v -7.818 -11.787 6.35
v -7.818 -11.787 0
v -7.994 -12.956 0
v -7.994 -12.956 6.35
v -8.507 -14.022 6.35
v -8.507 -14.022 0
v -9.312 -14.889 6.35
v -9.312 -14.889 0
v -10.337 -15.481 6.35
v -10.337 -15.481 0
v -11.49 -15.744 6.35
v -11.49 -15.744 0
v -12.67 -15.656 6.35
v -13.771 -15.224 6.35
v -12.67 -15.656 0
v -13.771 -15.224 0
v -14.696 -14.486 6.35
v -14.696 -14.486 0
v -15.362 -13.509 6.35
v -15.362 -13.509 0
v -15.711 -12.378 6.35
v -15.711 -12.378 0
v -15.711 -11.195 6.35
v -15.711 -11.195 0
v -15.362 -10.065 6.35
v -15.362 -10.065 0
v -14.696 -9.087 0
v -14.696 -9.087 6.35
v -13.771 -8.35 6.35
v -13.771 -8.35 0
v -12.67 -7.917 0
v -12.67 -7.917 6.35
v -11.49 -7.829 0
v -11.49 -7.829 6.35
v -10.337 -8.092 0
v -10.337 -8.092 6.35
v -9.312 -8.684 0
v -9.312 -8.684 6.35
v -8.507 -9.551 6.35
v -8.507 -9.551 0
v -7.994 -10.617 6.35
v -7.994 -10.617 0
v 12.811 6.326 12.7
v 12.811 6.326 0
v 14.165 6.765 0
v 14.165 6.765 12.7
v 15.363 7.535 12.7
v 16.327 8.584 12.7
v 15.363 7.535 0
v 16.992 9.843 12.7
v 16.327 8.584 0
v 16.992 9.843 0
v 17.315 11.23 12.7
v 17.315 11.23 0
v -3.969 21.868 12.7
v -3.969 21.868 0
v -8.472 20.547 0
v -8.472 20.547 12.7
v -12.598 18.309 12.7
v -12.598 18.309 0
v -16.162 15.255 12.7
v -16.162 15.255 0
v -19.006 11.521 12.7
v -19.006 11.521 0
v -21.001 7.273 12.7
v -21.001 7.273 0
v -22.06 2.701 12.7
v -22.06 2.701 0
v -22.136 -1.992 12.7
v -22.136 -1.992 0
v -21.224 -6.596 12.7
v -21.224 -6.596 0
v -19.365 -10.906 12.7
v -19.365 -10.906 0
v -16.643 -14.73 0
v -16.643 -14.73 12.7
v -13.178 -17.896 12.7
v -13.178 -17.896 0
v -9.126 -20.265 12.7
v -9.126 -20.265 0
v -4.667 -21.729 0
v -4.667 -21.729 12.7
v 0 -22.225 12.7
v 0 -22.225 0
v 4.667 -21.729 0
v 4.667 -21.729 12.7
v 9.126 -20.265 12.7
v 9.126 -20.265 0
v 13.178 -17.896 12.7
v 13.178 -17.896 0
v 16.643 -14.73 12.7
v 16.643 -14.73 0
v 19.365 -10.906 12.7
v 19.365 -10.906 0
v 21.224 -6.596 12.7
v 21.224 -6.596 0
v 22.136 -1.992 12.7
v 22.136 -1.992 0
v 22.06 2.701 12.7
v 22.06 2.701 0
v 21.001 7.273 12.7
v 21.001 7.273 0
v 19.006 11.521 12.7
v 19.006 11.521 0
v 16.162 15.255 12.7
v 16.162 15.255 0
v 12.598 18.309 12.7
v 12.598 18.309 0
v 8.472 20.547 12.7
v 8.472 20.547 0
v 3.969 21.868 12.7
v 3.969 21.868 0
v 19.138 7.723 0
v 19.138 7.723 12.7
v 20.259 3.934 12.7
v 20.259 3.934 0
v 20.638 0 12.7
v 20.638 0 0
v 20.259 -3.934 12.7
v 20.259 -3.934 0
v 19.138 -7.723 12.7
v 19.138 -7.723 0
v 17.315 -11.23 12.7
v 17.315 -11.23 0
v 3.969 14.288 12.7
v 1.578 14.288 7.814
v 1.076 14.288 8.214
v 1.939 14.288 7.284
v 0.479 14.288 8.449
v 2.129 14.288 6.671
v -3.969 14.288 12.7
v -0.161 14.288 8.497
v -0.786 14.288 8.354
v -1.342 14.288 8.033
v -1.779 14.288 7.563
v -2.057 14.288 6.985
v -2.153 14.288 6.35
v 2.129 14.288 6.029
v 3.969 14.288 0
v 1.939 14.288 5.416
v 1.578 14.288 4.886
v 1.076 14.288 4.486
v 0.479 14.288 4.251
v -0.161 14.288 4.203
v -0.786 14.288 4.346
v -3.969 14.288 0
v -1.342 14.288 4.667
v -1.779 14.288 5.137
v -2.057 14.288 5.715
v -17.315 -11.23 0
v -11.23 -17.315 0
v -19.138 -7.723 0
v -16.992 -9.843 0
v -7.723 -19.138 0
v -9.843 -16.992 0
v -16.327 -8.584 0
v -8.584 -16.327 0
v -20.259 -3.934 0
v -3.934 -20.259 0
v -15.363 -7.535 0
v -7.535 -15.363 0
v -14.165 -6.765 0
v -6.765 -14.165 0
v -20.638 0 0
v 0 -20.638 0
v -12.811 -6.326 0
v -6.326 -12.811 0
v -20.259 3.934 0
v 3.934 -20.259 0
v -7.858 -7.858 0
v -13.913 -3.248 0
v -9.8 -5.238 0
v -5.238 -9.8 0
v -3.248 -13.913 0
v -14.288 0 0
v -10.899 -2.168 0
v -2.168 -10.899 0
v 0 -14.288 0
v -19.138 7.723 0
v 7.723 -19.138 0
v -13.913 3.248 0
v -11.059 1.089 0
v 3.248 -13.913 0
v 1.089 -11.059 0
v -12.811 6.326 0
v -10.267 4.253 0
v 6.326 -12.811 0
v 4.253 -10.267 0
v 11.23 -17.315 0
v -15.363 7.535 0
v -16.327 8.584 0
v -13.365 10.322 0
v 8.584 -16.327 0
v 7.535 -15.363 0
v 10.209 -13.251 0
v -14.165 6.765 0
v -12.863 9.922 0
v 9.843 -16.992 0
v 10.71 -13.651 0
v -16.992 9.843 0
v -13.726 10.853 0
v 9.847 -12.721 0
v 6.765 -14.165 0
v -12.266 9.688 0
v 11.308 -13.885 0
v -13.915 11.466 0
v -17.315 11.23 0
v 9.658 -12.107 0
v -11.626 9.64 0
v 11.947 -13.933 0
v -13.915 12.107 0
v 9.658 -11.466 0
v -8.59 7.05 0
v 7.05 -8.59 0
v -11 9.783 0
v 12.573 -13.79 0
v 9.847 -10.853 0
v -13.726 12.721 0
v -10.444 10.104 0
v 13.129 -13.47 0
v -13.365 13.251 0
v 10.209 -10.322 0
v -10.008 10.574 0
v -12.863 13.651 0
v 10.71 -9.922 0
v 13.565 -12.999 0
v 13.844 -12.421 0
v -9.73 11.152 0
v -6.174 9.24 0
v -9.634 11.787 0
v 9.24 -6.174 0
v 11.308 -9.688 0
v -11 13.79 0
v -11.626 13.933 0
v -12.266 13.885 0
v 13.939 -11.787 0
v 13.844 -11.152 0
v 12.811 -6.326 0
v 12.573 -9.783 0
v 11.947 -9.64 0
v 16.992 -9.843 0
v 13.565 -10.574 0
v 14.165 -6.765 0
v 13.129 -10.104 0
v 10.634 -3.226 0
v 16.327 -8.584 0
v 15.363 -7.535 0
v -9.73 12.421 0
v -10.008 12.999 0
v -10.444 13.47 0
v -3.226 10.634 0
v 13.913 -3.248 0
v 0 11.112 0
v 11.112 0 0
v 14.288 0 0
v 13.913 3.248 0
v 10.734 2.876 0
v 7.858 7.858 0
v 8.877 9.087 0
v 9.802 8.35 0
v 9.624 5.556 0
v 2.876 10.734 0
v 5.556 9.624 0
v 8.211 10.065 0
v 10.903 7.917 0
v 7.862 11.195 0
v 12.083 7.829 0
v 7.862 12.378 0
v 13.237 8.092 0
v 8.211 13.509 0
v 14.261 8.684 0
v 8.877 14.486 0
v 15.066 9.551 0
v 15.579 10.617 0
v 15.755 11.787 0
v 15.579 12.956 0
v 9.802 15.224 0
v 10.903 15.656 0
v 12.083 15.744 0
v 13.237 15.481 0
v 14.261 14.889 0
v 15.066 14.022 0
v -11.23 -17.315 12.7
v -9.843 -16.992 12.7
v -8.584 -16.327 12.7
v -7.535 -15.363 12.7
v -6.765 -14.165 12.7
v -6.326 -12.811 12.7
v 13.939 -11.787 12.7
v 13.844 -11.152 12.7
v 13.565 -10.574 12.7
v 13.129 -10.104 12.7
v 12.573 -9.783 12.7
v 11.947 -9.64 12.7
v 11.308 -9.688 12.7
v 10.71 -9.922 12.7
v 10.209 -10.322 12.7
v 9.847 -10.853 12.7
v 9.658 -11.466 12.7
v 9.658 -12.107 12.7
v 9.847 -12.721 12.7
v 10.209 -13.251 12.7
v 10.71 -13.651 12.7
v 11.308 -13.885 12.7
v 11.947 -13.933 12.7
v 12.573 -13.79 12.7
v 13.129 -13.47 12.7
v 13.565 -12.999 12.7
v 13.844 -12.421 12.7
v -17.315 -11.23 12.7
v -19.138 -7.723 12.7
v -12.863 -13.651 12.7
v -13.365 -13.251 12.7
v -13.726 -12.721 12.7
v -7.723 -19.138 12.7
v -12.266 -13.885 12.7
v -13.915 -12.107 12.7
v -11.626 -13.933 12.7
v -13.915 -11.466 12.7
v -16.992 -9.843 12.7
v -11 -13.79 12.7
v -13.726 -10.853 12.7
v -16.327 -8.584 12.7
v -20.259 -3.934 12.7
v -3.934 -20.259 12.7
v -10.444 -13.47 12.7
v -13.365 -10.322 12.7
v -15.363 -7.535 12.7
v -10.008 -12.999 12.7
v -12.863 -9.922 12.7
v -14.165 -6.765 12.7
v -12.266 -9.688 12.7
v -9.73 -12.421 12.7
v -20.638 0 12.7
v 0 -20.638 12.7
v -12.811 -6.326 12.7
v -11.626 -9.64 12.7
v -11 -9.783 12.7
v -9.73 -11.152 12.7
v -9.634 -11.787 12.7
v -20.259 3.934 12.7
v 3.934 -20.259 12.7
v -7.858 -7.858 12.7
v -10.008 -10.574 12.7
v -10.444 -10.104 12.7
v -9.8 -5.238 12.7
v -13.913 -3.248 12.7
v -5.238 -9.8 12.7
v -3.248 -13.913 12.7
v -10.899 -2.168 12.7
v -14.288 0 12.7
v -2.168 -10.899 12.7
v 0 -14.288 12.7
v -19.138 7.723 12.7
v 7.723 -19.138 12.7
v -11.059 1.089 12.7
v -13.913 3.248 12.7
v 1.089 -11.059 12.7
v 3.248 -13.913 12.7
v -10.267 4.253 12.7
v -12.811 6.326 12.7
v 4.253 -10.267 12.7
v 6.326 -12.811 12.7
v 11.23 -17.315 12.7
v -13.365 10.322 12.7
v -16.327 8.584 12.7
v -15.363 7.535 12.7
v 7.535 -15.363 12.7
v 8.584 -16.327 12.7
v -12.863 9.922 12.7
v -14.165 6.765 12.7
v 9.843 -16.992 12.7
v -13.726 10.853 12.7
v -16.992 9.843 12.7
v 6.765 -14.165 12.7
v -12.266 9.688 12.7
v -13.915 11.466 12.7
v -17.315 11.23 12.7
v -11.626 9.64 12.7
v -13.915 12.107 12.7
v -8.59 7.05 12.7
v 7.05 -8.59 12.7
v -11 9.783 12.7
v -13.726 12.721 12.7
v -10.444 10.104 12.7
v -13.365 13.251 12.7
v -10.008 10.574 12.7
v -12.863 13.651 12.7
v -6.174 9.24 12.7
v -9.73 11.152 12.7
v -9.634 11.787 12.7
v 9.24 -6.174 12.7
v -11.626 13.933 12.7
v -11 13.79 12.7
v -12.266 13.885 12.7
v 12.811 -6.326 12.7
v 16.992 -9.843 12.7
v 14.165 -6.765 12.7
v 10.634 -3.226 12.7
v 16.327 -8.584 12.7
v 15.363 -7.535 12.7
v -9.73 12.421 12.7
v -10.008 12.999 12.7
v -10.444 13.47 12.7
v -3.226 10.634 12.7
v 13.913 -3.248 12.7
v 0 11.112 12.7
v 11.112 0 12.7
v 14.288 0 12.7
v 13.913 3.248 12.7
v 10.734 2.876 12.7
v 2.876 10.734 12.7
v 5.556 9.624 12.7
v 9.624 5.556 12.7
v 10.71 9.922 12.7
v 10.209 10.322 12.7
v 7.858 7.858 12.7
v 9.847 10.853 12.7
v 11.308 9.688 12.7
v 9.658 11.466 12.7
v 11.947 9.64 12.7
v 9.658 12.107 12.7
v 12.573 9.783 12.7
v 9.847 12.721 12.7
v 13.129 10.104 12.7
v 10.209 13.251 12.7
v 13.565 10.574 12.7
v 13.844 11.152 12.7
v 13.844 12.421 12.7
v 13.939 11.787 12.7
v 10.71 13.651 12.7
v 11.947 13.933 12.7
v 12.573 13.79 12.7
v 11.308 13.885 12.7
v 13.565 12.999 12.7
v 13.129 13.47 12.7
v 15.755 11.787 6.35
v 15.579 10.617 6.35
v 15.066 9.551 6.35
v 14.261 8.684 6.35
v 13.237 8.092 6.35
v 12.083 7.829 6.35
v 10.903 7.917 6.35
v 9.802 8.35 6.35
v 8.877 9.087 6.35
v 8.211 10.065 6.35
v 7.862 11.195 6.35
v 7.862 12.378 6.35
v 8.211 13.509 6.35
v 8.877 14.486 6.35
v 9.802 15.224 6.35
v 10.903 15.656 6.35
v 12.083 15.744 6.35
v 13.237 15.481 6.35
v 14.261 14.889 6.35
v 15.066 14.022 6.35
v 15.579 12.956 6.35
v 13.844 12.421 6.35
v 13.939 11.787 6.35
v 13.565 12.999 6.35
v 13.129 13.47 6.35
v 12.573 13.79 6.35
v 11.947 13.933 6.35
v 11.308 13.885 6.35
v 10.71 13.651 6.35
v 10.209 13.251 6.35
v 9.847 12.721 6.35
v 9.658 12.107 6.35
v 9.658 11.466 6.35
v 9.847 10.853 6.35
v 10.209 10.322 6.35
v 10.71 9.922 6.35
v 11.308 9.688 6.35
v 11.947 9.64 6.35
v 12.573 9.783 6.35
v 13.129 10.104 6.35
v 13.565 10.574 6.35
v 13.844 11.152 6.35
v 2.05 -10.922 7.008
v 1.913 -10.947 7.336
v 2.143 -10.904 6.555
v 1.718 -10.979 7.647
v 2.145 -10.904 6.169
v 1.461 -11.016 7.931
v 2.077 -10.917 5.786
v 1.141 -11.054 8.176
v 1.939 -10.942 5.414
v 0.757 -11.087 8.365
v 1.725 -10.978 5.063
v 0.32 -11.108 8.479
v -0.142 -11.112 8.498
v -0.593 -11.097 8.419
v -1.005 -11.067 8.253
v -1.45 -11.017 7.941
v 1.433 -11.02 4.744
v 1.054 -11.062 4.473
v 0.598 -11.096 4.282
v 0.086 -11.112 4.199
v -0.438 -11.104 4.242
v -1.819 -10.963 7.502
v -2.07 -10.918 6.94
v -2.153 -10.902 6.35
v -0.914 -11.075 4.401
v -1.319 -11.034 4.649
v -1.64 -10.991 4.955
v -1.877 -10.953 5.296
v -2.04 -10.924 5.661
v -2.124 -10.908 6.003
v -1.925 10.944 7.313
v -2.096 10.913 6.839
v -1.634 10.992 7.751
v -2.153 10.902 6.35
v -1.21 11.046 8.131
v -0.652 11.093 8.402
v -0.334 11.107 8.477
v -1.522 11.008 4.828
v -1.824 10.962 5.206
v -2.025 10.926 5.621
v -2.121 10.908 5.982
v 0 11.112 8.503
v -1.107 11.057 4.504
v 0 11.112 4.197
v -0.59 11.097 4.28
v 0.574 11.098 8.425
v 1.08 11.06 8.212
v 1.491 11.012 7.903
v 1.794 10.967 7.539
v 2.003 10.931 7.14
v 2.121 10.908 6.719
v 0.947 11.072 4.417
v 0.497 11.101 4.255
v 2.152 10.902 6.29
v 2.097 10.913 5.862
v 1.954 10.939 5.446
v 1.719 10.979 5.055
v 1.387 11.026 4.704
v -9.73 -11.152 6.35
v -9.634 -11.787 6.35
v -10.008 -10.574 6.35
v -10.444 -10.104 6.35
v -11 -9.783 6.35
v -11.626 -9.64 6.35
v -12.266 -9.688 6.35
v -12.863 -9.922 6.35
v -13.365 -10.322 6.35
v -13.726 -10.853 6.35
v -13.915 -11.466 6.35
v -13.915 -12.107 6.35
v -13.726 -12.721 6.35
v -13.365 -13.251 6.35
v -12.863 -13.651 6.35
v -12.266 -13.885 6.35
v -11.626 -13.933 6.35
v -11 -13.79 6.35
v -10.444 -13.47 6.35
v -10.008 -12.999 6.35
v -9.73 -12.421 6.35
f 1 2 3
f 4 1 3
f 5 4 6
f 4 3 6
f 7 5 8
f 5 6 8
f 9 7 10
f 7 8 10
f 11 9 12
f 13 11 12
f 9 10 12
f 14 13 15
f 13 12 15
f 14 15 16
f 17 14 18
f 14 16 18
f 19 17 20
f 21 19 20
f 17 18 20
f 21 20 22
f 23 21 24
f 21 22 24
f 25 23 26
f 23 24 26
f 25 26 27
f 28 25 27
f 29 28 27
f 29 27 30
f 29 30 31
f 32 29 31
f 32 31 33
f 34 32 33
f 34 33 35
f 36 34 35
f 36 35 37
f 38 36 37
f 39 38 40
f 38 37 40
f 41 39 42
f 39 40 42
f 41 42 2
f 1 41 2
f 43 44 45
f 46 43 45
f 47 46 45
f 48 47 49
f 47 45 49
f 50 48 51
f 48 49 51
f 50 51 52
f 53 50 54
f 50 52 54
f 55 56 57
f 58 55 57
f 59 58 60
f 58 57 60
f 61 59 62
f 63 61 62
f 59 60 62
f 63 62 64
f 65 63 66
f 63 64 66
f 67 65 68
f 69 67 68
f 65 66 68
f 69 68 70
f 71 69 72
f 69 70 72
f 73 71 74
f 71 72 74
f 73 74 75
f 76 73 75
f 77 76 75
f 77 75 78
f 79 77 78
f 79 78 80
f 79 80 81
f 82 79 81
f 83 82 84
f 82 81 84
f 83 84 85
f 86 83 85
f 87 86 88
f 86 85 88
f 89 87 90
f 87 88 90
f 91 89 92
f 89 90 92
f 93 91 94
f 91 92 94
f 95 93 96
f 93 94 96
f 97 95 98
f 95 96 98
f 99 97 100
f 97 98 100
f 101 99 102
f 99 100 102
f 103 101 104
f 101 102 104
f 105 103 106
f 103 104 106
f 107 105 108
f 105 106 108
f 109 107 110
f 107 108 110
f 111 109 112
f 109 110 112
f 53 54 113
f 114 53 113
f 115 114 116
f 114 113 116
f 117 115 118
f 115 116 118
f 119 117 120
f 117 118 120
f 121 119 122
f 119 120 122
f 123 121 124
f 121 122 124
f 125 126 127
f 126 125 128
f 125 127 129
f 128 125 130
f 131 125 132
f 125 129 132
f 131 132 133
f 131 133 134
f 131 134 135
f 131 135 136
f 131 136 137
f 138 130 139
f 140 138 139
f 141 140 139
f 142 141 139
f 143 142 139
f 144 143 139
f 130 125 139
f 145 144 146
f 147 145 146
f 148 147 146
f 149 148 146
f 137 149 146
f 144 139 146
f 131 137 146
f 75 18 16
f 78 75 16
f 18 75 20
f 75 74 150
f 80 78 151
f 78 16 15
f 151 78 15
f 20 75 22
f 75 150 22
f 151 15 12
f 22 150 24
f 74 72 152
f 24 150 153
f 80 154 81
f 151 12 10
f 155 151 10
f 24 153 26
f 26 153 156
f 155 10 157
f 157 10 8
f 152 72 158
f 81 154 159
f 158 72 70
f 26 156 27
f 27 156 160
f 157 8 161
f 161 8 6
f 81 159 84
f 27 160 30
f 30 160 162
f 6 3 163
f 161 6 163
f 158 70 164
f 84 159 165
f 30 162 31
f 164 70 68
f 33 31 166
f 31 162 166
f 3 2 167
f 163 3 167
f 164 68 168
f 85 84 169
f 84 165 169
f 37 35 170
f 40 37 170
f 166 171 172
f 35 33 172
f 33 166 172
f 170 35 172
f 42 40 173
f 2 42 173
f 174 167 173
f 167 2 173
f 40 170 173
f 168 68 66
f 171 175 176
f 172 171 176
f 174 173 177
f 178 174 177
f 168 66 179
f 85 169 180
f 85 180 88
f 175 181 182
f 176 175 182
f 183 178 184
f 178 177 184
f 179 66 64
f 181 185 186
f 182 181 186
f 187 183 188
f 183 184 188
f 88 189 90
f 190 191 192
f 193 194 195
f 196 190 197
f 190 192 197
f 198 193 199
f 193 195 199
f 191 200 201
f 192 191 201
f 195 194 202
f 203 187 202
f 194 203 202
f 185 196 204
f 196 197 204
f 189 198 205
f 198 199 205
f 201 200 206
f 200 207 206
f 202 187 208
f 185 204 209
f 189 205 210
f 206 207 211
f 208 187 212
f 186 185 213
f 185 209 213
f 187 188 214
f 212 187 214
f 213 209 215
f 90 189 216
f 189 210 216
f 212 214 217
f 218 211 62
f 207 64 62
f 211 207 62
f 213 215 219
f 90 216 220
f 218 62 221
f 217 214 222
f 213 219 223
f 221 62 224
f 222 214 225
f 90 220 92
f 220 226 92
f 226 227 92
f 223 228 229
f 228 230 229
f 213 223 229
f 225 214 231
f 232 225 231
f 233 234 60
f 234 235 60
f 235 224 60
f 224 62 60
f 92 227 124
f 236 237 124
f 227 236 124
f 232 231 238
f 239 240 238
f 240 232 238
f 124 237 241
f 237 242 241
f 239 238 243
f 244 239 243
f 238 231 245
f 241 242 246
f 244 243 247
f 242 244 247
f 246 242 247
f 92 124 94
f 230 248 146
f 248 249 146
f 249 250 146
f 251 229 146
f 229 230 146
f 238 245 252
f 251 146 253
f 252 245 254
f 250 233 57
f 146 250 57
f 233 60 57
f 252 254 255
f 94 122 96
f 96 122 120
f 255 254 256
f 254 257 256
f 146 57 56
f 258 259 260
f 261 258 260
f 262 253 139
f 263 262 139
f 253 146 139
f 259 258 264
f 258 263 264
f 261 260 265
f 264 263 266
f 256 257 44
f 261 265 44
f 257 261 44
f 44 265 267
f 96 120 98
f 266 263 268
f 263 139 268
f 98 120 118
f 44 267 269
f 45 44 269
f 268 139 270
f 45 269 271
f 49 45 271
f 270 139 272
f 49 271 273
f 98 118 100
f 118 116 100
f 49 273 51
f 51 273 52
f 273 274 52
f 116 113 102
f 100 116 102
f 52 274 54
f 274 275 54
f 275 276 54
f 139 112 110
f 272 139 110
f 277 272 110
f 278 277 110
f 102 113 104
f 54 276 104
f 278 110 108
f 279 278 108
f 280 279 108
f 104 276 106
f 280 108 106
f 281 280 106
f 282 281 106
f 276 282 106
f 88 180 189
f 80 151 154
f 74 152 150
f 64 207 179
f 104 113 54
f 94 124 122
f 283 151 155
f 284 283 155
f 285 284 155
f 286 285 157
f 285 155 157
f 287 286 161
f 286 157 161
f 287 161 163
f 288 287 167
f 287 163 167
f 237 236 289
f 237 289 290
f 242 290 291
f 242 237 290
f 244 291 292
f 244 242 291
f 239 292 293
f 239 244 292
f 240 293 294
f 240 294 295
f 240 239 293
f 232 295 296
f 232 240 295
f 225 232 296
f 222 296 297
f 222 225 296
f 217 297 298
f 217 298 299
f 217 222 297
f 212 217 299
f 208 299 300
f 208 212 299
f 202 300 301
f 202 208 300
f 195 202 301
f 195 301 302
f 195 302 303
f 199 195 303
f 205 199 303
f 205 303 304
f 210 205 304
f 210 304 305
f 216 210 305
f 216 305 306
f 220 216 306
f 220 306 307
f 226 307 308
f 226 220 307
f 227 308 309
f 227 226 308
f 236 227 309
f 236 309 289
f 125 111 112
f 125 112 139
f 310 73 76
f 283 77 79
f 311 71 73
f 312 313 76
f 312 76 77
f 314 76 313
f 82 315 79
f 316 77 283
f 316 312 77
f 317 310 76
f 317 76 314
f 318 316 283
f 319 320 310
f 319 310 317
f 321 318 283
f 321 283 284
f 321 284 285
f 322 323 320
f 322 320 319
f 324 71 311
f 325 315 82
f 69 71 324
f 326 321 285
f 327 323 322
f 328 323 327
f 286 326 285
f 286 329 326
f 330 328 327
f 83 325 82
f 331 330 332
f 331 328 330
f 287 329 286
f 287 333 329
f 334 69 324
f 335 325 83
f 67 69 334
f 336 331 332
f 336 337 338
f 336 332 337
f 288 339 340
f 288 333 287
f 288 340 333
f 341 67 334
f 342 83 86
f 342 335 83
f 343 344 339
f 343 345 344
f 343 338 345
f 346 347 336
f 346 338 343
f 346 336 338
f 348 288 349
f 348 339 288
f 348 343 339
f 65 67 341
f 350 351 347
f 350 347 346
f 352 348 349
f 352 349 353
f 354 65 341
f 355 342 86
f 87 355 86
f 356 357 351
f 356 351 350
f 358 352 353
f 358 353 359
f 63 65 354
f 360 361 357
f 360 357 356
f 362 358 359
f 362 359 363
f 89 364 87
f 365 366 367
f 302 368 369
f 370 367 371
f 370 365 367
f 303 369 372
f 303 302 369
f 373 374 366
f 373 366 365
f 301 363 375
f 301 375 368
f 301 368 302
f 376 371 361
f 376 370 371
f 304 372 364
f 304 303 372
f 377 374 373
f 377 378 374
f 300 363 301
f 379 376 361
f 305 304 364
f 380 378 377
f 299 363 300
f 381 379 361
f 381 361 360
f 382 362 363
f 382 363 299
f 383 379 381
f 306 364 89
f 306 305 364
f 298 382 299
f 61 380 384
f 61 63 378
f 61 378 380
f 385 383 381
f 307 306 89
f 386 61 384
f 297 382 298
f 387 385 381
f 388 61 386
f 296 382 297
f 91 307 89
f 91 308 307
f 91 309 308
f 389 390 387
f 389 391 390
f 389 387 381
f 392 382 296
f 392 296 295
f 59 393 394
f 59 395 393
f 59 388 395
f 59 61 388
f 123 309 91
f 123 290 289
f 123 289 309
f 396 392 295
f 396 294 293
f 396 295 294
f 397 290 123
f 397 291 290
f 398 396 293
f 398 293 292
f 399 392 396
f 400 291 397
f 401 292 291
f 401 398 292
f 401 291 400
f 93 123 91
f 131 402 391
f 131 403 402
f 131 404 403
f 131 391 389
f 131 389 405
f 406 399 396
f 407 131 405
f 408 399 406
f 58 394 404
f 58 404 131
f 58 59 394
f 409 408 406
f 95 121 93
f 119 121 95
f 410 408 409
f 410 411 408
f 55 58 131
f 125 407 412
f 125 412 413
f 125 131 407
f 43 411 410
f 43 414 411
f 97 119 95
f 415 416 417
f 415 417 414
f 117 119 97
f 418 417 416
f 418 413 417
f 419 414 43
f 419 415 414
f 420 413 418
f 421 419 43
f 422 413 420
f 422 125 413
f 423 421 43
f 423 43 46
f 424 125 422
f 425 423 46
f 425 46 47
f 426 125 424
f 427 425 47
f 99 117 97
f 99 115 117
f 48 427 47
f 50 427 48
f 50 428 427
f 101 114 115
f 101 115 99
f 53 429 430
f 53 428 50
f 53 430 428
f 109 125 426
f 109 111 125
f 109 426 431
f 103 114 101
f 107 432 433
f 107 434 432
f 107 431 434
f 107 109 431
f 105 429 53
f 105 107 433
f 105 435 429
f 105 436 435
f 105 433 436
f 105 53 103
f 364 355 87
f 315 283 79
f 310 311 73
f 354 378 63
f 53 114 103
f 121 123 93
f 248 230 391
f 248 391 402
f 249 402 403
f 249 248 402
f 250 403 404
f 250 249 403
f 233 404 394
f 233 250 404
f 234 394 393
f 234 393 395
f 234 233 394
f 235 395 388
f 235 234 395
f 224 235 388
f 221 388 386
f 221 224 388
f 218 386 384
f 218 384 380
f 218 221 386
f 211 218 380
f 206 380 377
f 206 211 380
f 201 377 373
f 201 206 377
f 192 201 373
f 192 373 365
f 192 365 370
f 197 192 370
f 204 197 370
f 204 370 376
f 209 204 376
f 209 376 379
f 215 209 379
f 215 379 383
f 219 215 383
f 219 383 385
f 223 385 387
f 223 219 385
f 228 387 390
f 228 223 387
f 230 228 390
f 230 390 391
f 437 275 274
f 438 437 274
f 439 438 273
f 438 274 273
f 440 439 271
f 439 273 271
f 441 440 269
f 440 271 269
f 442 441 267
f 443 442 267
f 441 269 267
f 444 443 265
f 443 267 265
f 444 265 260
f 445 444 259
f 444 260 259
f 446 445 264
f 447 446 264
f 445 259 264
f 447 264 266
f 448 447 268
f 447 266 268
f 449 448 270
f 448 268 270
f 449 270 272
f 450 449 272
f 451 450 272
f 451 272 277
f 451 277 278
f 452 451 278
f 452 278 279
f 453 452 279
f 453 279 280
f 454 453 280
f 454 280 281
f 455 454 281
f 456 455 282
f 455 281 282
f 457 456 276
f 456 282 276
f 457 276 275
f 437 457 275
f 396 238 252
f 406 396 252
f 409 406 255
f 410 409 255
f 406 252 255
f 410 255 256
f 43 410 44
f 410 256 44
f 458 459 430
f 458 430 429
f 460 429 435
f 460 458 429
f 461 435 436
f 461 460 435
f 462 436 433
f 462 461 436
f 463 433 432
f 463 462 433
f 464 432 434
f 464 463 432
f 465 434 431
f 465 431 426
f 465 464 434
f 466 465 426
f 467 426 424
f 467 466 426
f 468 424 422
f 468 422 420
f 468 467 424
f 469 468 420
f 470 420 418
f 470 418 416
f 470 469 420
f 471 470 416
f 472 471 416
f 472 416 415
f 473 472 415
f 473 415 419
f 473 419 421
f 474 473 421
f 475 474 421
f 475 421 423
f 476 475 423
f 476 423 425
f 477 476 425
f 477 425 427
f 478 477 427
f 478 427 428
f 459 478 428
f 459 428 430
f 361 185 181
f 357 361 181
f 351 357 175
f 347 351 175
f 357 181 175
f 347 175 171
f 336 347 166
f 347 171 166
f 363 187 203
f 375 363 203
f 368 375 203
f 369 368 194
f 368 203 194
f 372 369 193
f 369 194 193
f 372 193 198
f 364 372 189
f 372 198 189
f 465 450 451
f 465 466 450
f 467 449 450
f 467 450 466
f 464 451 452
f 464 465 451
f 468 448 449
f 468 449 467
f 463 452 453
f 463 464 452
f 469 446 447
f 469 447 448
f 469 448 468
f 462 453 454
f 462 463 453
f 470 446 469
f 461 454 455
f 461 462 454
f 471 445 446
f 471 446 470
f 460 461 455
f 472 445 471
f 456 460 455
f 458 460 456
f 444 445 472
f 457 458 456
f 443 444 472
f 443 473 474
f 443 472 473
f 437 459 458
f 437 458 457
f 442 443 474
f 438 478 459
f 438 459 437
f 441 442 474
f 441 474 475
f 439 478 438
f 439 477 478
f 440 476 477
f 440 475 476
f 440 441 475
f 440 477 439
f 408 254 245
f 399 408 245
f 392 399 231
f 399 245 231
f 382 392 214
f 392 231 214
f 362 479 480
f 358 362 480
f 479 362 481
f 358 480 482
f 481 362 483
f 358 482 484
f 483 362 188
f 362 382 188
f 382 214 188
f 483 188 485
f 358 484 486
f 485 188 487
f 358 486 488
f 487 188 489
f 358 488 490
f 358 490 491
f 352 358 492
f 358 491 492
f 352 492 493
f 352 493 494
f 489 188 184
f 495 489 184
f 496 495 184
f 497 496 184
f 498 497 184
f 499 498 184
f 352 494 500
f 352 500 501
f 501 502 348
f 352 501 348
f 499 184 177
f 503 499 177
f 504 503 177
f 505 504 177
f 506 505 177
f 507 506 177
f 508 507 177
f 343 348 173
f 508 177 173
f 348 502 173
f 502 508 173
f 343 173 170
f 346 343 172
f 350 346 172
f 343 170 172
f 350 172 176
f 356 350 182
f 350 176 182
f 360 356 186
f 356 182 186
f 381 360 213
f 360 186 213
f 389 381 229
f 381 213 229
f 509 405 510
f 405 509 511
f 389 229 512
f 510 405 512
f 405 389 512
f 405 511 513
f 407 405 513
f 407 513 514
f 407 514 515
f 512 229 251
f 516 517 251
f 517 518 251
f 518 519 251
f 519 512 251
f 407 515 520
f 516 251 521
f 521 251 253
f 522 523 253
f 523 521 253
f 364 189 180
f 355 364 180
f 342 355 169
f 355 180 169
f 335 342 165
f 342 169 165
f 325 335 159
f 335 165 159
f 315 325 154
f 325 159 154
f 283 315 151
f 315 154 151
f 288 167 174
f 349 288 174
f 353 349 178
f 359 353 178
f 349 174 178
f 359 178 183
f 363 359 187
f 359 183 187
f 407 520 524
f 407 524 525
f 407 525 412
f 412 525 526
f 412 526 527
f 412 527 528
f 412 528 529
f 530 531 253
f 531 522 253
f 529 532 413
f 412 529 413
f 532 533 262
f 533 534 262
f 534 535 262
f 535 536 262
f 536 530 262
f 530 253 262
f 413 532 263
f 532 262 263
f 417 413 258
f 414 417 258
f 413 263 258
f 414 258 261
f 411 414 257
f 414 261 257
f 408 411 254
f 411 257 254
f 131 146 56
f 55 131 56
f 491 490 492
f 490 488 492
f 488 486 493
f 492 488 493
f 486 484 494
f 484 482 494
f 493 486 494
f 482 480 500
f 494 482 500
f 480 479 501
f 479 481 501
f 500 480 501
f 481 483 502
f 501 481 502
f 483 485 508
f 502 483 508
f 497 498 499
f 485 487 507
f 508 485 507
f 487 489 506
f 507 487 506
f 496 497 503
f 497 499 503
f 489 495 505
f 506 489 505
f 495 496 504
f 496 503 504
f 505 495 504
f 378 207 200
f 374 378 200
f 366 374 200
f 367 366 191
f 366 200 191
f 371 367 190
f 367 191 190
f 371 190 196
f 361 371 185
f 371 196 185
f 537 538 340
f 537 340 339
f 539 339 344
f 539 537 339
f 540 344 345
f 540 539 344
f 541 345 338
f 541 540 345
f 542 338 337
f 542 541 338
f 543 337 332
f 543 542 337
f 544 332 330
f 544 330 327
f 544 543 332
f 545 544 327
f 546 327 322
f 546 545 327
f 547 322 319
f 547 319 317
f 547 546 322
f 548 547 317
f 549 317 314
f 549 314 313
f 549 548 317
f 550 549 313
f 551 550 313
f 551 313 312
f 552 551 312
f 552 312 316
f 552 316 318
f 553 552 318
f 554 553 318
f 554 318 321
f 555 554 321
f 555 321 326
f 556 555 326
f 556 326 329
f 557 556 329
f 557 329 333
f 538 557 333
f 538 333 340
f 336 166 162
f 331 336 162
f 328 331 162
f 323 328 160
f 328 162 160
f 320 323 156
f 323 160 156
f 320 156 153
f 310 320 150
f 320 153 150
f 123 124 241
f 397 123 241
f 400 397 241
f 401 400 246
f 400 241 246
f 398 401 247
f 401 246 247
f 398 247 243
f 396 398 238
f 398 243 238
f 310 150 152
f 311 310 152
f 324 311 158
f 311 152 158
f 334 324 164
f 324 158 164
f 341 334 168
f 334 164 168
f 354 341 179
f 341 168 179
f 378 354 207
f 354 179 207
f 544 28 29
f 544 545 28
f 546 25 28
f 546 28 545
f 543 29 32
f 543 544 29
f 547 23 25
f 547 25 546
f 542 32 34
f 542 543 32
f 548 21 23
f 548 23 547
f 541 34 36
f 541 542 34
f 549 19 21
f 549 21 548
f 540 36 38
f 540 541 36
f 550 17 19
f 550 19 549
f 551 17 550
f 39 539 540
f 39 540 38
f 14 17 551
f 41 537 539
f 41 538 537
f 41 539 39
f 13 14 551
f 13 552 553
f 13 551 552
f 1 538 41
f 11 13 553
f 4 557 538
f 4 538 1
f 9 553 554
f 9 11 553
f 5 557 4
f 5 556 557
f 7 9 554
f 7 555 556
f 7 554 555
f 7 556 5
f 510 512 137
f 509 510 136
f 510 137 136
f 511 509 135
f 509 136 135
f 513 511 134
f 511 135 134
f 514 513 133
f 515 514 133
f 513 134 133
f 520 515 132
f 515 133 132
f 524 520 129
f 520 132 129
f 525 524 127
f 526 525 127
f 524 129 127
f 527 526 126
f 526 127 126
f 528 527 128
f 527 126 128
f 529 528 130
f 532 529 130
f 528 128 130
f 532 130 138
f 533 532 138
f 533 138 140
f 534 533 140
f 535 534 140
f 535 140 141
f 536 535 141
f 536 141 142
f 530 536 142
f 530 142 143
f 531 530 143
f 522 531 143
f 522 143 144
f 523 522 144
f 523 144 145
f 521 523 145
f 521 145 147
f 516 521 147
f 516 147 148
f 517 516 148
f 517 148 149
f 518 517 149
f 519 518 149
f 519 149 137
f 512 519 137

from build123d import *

# Parameters (mm, degrees)
F0_R            = 2.15265
F1_DEPTH        = 12.7
F2_R            = 2.15265
F3_REACH        = 42.6021136501
F5_R            = 3.96875
F6_DEPTH        = 6.35
F8_DEPTH        = 12.7
F8_COPIES_COUNT = 3
F8_COPIES_ANGLE = 180


# Not quite as in the source:
# - a pattern or mirror of a feature is missing from the dataset's text; its kind, count and spacing are read off the source's solid


with BuildPart() as f1:
    # F0 (on Top) → F1 (new body)
    with BuildSketch(Plane.XY):
        with BuildLine():
            Line((3.96875, 14.2875), (0, 14.2875))
            Line((0, 14.2875), (-3.96875, 14.2875))
            Line((-3.96875, 14.2875), (-3.96875, 21.8677764859))
            ThreePointArc((-3.96875, 21.8677764859), (0, -22.225), (3.96875, 21.8677764859))
            Line((3.96875, 21.8677764859), (3.96875, 14.2875))
        make_face()
        with Locations((-11.7865861589, -11.7865861589)):
            Circle(F0_R, mode=Mode.SUBTRACT)
        with Locations((11.7865861589, -11.7865861589)):
            Circle(F0_R, mode=Mode.SUBTRACT)
        with Locations((-11.7865861589, 11.7865861589)):
            Circle(F0_R, mode=Mode.SUBTRACT)
        with BuildLine():
            ThreePointArc((0, 11.1125), (7.8577241059, 7.8577241059), (11.1125, 0))
            ThreePointArc((11.1125, 0), (-7.8577241059, -7.8577241059), (0, 11.1125))
        make_face(mode=Mode.SUBTRACT)
        with Locations((11.7865861589, 11.7865861589)):
            Circle(F0_R, mode=Mode.SUBTRACT)
    extrude(amount=F1_DEPTH)

    f3_end = f1.faces().sort_by_distance((0, -11.1125, 6.35))[0]
    # F2 (on face) → F3 (cut, up to a face of the model that its end follows)
    with BuildSketch(Plane(origin=(0, 14.2875, 0), x_dir=(-1, 0, 0), z_dir=(0, 1, 0))):
        with Locations((0, 6.35)):
            Circle(F2_R)
    f3_long = extrude(amount=-F3_REACH, mode=Mode.PRIVATE)
    add(split(f3_long, bisect_by=f3_end, keep=Keep.ALL, mode=Mode.PRIVATE).solids().sort_by_distance((0, 14.2875, 6.35))[0], mode=Mode.SUBTRACT)

    # F5 (on face) → F6 (cut, through all)
    with BuildSketch(Plane(origin=(0, 0, 0), x_dir=(1, 0, 0), z_dir=(0, 0, -1))):
        with Locations((11.7865861589, -11.7865861589)):
            Circle(F5_R)
        with Locations((-11.7865861589, 11.7865861589)):
            Circle(F5_R)
    extrude(amount=-F6_DEPTH, mode=Mode.SUBTRACT)

    # F7 (on face) → F8 (cut, through all)
    with BuildSketch(Plane(origin=(0, 0, 0), x_dir=(1, 0, 0), z_dir=(0, 0, -1))):
        with BuildLine():
            ThreePointArc((-17.3148424047, -11.229543123), (-15.8788163052, -8.0281867), (-12.8109235396, -6.3255746232))
            ThreePointArc((-12.8109235396, -6.3255746232), (-14.2875, 0), (-12.8109235396, 6.3255746232))
            ThreePointArc((-12.8109235396, 6.3255746232), (-15.8788163052, 8.0281867), (-17.3148424047, 11.229543123))
            ThreePointArc((-17.3148424047, 11.229543123), (-20.6375, 0), (-17.3148424047, -11.229543123))
        make_face()
    f8 = extrude(amount=-F8_DEPTH, mode=Mode.SUBTRACT)

    # F8_copies: F8 ×3 about axis
    f8_copies_axis = Axis((0, 0, 0), (0, 0, 1))
    for i in range(1, F8_COPIES_COUNT):
        add(f8.rotate(f8_copies_axis, i * F8_COPIES_ANGLE / (F8_COPIES_COUNT - 1)), mode=Mode.SUBTRACT)


solid = f1.part
